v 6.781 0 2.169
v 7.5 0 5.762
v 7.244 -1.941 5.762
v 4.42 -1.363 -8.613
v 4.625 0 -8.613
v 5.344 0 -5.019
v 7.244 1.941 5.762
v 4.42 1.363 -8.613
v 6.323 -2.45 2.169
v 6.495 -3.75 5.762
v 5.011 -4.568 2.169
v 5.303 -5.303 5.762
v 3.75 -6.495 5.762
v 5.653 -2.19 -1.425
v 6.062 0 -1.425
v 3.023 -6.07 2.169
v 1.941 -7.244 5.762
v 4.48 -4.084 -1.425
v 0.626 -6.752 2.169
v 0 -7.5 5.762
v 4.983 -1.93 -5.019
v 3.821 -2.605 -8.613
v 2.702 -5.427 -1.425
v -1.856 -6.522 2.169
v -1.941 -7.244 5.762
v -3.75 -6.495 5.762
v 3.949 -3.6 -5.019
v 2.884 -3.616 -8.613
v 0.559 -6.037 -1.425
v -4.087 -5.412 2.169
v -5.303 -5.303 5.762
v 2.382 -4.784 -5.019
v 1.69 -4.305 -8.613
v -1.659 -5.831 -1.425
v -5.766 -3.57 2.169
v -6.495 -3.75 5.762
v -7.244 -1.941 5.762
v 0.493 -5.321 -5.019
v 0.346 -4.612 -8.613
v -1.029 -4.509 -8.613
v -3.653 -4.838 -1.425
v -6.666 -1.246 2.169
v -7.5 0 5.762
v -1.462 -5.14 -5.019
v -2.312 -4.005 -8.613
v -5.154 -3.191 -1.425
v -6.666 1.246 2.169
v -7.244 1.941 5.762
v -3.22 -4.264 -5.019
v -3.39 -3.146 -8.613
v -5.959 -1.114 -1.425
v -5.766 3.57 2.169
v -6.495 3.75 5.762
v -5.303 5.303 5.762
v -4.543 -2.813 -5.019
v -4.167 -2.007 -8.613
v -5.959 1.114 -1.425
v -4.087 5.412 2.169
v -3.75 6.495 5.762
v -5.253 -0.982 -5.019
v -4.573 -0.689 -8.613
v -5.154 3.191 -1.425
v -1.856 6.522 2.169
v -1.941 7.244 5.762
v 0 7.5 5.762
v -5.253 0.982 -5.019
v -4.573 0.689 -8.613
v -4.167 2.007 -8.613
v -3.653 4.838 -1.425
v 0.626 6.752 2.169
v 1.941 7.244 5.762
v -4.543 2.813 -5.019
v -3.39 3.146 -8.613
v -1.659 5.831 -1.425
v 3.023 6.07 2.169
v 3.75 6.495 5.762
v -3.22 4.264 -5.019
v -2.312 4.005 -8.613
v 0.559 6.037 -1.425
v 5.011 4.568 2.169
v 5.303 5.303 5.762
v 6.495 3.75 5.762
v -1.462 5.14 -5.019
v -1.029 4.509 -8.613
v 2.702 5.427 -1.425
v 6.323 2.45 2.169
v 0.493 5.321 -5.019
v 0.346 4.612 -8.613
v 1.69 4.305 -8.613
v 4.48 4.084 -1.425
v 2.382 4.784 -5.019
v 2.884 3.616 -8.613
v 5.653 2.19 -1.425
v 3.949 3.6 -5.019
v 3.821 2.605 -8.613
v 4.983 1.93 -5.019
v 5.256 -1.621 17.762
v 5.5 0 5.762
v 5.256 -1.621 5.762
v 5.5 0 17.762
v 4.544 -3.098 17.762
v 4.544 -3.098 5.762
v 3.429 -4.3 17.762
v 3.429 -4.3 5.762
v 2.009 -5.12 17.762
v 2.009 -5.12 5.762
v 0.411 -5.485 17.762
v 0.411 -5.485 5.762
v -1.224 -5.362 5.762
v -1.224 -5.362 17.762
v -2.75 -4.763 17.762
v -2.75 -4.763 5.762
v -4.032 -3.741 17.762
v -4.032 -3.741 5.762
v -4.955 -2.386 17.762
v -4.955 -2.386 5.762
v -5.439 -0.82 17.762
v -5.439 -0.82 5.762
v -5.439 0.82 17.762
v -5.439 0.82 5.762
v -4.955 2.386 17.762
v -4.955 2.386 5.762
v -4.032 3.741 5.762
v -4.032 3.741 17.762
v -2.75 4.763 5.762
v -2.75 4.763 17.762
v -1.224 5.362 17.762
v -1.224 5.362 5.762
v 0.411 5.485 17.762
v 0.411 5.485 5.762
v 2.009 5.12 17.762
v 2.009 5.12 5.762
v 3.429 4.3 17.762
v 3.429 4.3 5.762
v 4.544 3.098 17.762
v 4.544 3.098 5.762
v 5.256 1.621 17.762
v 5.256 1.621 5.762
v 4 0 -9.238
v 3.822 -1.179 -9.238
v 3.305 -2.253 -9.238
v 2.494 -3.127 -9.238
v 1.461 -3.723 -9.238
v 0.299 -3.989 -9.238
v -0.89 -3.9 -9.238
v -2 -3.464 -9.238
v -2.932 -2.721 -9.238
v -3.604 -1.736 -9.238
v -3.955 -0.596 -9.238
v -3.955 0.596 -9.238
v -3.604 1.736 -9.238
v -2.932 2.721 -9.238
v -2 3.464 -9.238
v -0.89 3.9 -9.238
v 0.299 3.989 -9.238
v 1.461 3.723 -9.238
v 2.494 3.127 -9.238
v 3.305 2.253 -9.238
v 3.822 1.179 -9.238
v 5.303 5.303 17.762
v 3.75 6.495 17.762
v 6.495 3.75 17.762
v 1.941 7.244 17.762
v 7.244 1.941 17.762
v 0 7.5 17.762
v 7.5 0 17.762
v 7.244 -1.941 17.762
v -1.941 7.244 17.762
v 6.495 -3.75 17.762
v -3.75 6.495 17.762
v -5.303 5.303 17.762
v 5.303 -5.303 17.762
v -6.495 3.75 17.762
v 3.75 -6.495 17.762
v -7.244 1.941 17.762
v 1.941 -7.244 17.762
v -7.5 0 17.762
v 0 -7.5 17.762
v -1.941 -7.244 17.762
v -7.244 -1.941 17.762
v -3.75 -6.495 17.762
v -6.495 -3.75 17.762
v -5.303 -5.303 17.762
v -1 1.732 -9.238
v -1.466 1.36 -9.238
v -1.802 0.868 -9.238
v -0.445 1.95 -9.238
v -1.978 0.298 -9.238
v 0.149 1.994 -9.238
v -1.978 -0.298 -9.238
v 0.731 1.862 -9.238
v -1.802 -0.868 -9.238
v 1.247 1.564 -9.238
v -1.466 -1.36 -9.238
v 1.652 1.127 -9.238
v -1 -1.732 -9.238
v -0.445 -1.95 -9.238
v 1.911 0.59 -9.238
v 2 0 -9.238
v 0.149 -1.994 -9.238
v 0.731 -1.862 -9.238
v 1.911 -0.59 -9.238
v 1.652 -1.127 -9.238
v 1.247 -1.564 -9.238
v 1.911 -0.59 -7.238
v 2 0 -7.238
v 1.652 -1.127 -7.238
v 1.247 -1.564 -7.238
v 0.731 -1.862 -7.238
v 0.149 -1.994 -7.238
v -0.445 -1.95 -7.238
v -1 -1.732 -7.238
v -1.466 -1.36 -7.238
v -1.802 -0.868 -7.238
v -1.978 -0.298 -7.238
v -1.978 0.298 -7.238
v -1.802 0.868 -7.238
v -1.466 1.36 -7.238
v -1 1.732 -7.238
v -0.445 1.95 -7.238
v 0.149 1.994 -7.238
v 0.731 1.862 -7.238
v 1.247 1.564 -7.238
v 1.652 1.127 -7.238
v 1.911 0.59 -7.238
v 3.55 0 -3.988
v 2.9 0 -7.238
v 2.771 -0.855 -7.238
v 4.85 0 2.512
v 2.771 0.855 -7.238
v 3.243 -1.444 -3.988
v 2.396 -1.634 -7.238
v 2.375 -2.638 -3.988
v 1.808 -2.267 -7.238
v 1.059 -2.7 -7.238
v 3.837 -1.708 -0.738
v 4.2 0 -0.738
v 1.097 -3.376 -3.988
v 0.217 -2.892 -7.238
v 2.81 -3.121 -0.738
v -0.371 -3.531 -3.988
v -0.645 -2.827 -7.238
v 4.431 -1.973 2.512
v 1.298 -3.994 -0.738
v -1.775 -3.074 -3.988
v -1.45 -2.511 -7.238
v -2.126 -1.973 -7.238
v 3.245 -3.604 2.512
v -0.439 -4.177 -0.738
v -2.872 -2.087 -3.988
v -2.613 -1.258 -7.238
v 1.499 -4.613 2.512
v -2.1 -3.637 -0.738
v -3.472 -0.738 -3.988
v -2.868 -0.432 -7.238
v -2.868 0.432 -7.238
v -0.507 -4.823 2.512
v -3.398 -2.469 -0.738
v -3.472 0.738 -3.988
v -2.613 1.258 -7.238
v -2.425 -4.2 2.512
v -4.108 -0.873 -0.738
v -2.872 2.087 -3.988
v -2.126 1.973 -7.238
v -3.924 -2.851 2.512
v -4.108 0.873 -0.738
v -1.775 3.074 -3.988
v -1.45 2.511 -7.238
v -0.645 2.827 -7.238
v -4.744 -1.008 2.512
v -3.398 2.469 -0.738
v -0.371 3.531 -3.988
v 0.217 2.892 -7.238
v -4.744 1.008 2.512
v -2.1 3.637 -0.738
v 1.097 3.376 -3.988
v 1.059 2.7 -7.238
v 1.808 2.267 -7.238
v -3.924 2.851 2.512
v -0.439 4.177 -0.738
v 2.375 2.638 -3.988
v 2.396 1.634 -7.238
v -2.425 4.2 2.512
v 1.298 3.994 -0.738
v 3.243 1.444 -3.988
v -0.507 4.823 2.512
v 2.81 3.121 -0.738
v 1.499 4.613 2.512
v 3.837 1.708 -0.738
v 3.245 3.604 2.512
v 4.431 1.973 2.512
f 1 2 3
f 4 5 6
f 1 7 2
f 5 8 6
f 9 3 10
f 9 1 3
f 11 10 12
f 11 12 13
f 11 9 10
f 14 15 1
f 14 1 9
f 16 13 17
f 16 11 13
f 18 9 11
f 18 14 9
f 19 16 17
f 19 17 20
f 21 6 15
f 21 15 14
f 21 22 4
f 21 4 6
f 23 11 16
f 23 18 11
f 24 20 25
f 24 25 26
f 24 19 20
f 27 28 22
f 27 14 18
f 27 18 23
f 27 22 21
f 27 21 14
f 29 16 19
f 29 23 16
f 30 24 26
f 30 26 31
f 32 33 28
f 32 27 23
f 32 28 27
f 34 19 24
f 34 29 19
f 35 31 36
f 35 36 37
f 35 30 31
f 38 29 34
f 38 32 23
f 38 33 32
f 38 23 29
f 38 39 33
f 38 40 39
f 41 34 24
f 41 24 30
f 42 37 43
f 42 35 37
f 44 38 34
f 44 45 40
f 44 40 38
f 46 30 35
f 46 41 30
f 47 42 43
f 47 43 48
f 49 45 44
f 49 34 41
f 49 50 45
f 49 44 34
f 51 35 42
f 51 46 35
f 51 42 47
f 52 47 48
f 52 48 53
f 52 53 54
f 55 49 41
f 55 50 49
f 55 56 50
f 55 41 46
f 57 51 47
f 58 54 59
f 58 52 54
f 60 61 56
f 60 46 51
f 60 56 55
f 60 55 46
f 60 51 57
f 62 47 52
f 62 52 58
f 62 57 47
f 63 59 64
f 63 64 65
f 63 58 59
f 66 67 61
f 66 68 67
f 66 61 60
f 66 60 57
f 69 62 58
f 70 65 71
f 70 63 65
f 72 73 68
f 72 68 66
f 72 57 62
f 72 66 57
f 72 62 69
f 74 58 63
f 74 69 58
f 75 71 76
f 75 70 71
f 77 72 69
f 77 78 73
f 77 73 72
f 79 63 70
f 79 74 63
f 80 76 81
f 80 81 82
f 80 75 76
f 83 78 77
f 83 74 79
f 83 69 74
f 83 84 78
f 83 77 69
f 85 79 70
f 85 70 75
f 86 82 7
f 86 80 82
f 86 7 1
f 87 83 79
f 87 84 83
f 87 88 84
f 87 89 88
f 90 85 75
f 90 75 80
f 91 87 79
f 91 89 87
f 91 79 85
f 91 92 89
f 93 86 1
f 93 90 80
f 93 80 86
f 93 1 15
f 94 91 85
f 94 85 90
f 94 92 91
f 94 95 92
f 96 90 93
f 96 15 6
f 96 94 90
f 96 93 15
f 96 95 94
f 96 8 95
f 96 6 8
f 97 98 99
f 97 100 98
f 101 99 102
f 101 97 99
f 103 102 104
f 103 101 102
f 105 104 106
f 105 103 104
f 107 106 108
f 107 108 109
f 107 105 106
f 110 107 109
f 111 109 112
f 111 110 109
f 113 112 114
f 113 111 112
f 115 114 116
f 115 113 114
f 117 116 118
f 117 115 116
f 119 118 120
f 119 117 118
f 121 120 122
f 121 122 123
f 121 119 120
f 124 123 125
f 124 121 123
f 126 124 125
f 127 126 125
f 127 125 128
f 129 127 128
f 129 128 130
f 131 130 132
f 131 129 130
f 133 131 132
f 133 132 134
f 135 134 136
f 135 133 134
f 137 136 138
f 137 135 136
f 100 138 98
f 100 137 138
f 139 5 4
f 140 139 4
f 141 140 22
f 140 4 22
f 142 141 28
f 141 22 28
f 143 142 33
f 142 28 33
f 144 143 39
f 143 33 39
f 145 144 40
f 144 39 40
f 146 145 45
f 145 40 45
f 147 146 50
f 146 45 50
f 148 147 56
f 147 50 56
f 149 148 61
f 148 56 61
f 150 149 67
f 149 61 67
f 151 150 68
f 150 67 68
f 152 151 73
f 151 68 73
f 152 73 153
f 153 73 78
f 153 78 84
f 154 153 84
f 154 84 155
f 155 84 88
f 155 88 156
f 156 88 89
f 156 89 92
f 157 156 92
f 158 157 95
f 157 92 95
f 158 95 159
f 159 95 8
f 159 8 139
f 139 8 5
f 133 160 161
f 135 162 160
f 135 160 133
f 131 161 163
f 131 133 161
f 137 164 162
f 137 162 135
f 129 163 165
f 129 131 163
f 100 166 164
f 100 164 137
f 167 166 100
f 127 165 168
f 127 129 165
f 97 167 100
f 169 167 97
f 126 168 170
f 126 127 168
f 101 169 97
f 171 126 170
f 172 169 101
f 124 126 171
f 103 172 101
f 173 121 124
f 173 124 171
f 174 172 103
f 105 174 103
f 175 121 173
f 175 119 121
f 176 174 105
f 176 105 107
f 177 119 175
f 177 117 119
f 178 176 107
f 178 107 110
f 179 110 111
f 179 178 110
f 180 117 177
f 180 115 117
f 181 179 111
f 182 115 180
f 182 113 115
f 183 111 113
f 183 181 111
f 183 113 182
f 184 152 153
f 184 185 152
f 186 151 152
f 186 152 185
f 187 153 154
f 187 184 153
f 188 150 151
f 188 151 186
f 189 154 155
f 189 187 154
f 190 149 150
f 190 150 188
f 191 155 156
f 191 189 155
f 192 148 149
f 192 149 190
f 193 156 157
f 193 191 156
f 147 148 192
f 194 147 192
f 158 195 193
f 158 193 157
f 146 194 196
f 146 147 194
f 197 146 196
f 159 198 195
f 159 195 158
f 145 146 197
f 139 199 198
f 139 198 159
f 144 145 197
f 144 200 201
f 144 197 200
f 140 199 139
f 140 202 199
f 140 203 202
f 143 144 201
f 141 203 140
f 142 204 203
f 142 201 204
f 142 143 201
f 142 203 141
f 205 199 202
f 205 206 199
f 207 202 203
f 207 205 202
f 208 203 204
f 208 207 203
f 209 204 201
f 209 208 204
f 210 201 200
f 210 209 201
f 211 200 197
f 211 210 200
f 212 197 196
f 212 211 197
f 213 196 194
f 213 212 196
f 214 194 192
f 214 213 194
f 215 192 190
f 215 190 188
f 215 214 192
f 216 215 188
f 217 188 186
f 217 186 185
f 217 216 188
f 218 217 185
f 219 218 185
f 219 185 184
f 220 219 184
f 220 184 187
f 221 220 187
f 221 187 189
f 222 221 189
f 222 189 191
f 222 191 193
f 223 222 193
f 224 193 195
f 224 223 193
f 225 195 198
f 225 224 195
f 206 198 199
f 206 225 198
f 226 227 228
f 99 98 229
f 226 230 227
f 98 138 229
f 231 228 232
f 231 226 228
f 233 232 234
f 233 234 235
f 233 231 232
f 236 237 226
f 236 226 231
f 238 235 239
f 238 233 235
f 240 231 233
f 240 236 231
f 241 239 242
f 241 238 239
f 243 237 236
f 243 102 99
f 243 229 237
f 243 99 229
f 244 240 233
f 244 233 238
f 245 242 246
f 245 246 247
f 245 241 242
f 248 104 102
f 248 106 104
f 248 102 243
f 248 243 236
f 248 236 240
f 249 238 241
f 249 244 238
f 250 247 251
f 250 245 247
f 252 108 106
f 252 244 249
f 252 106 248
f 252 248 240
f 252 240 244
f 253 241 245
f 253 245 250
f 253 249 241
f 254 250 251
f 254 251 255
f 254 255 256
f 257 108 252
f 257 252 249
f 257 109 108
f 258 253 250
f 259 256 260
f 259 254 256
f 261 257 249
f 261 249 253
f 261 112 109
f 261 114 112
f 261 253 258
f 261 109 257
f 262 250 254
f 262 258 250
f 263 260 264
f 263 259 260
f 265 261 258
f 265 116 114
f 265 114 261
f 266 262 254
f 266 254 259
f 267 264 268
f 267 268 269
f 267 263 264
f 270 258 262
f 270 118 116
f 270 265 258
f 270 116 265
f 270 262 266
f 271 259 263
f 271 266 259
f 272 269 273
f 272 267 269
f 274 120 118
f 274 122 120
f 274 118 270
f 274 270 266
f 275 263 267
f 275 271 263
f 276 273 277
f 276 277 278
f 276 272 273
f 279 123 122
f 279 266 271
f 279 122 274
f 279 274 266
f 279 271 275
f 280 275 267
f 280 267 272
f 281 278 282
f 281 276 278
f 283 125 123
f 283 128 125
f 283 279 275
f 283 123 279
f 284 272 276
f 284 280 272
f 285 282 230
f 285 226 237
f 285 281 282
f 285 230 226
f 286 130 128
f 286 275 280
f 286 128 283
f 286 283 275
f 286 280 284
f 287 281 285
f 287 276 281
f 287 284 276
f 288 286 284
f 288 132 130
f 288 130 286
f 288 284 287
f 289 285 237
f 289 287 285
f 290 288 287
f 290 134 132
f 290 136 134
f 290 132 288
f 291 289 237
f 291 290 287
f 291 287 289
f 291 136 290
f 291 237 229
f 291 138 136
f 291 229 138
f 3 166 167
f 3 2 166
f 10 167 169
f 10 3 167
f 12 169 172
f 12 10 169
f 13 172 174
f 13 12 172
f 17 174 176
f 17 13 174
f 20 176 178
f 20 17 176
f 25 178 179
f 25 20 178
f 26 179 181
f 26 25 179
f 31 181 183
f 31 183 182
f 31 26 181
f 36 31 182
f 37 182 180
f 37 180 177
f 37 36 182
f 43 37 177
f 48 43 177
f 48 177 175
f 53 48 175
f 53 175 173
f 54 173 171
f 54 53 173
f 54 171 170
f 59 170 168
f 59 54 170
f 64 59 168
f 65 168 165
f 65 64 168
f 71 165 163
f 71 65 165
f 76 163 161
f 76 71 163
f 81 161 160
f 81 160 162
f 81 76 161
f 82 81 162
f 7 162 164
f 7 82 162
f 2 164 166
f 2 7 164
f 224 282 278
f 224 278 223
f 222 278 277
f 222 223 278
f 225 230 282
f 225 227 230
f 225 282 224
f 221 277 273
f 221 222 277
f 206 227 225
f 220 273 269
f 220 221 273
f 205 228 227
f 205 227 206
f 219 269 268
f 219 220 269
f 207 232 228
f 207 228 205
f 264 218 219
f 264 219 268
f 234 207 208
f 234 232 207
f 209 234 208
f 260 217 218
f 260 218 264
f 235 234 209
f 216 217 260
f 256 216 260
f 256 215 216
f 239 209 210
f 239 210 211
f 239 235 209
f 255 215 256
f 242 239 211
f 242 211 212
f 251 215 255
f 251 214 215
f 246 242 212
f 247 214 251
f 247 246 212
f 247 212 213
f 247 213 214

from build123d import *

# Parameters (mm, degrees)
CHAMFER1_SIZE  = 0.5
CHAMFER1_SIZE2 = 0.637377439


with BuildPart() as part:
    # Sketch1 → Revolve1 (revolve)
    with BuildSketch(Plane(origin=(0, 0, 0), x_dir=(1, 0, 0), z_dir=(0, 1, 0))):
        Polygon((2, 9.237606838), (2, 7.237606838), (2.9, 7.237606838), (5.5, -5.762393162), (5.5, -17.762393162), (7.5, -17.762393162), (7.5, -5.762393162), (4.5, 9.237606838), align=None)
    revolve(axis=Axis((0, 0, 0), (0, 0, -1)))

    # Chamfer1
    chamfer1_edges = [part.edges().sort_by_distance(p)[0] for p in [
        (-4.5, 0, -9.237606838),
    ]]
    chamfer1_side = [part.faces().sort_by_distance(p)[0] for p in [
        (-4.372720779, 0, -9.237606838),
    ]]
    chamfer(chamfer1_edges, length=CHAMFER1_SIZE, length2=CHAMFER1_SIZE2, reference=chamfer1_side[0])


solid = part.part
